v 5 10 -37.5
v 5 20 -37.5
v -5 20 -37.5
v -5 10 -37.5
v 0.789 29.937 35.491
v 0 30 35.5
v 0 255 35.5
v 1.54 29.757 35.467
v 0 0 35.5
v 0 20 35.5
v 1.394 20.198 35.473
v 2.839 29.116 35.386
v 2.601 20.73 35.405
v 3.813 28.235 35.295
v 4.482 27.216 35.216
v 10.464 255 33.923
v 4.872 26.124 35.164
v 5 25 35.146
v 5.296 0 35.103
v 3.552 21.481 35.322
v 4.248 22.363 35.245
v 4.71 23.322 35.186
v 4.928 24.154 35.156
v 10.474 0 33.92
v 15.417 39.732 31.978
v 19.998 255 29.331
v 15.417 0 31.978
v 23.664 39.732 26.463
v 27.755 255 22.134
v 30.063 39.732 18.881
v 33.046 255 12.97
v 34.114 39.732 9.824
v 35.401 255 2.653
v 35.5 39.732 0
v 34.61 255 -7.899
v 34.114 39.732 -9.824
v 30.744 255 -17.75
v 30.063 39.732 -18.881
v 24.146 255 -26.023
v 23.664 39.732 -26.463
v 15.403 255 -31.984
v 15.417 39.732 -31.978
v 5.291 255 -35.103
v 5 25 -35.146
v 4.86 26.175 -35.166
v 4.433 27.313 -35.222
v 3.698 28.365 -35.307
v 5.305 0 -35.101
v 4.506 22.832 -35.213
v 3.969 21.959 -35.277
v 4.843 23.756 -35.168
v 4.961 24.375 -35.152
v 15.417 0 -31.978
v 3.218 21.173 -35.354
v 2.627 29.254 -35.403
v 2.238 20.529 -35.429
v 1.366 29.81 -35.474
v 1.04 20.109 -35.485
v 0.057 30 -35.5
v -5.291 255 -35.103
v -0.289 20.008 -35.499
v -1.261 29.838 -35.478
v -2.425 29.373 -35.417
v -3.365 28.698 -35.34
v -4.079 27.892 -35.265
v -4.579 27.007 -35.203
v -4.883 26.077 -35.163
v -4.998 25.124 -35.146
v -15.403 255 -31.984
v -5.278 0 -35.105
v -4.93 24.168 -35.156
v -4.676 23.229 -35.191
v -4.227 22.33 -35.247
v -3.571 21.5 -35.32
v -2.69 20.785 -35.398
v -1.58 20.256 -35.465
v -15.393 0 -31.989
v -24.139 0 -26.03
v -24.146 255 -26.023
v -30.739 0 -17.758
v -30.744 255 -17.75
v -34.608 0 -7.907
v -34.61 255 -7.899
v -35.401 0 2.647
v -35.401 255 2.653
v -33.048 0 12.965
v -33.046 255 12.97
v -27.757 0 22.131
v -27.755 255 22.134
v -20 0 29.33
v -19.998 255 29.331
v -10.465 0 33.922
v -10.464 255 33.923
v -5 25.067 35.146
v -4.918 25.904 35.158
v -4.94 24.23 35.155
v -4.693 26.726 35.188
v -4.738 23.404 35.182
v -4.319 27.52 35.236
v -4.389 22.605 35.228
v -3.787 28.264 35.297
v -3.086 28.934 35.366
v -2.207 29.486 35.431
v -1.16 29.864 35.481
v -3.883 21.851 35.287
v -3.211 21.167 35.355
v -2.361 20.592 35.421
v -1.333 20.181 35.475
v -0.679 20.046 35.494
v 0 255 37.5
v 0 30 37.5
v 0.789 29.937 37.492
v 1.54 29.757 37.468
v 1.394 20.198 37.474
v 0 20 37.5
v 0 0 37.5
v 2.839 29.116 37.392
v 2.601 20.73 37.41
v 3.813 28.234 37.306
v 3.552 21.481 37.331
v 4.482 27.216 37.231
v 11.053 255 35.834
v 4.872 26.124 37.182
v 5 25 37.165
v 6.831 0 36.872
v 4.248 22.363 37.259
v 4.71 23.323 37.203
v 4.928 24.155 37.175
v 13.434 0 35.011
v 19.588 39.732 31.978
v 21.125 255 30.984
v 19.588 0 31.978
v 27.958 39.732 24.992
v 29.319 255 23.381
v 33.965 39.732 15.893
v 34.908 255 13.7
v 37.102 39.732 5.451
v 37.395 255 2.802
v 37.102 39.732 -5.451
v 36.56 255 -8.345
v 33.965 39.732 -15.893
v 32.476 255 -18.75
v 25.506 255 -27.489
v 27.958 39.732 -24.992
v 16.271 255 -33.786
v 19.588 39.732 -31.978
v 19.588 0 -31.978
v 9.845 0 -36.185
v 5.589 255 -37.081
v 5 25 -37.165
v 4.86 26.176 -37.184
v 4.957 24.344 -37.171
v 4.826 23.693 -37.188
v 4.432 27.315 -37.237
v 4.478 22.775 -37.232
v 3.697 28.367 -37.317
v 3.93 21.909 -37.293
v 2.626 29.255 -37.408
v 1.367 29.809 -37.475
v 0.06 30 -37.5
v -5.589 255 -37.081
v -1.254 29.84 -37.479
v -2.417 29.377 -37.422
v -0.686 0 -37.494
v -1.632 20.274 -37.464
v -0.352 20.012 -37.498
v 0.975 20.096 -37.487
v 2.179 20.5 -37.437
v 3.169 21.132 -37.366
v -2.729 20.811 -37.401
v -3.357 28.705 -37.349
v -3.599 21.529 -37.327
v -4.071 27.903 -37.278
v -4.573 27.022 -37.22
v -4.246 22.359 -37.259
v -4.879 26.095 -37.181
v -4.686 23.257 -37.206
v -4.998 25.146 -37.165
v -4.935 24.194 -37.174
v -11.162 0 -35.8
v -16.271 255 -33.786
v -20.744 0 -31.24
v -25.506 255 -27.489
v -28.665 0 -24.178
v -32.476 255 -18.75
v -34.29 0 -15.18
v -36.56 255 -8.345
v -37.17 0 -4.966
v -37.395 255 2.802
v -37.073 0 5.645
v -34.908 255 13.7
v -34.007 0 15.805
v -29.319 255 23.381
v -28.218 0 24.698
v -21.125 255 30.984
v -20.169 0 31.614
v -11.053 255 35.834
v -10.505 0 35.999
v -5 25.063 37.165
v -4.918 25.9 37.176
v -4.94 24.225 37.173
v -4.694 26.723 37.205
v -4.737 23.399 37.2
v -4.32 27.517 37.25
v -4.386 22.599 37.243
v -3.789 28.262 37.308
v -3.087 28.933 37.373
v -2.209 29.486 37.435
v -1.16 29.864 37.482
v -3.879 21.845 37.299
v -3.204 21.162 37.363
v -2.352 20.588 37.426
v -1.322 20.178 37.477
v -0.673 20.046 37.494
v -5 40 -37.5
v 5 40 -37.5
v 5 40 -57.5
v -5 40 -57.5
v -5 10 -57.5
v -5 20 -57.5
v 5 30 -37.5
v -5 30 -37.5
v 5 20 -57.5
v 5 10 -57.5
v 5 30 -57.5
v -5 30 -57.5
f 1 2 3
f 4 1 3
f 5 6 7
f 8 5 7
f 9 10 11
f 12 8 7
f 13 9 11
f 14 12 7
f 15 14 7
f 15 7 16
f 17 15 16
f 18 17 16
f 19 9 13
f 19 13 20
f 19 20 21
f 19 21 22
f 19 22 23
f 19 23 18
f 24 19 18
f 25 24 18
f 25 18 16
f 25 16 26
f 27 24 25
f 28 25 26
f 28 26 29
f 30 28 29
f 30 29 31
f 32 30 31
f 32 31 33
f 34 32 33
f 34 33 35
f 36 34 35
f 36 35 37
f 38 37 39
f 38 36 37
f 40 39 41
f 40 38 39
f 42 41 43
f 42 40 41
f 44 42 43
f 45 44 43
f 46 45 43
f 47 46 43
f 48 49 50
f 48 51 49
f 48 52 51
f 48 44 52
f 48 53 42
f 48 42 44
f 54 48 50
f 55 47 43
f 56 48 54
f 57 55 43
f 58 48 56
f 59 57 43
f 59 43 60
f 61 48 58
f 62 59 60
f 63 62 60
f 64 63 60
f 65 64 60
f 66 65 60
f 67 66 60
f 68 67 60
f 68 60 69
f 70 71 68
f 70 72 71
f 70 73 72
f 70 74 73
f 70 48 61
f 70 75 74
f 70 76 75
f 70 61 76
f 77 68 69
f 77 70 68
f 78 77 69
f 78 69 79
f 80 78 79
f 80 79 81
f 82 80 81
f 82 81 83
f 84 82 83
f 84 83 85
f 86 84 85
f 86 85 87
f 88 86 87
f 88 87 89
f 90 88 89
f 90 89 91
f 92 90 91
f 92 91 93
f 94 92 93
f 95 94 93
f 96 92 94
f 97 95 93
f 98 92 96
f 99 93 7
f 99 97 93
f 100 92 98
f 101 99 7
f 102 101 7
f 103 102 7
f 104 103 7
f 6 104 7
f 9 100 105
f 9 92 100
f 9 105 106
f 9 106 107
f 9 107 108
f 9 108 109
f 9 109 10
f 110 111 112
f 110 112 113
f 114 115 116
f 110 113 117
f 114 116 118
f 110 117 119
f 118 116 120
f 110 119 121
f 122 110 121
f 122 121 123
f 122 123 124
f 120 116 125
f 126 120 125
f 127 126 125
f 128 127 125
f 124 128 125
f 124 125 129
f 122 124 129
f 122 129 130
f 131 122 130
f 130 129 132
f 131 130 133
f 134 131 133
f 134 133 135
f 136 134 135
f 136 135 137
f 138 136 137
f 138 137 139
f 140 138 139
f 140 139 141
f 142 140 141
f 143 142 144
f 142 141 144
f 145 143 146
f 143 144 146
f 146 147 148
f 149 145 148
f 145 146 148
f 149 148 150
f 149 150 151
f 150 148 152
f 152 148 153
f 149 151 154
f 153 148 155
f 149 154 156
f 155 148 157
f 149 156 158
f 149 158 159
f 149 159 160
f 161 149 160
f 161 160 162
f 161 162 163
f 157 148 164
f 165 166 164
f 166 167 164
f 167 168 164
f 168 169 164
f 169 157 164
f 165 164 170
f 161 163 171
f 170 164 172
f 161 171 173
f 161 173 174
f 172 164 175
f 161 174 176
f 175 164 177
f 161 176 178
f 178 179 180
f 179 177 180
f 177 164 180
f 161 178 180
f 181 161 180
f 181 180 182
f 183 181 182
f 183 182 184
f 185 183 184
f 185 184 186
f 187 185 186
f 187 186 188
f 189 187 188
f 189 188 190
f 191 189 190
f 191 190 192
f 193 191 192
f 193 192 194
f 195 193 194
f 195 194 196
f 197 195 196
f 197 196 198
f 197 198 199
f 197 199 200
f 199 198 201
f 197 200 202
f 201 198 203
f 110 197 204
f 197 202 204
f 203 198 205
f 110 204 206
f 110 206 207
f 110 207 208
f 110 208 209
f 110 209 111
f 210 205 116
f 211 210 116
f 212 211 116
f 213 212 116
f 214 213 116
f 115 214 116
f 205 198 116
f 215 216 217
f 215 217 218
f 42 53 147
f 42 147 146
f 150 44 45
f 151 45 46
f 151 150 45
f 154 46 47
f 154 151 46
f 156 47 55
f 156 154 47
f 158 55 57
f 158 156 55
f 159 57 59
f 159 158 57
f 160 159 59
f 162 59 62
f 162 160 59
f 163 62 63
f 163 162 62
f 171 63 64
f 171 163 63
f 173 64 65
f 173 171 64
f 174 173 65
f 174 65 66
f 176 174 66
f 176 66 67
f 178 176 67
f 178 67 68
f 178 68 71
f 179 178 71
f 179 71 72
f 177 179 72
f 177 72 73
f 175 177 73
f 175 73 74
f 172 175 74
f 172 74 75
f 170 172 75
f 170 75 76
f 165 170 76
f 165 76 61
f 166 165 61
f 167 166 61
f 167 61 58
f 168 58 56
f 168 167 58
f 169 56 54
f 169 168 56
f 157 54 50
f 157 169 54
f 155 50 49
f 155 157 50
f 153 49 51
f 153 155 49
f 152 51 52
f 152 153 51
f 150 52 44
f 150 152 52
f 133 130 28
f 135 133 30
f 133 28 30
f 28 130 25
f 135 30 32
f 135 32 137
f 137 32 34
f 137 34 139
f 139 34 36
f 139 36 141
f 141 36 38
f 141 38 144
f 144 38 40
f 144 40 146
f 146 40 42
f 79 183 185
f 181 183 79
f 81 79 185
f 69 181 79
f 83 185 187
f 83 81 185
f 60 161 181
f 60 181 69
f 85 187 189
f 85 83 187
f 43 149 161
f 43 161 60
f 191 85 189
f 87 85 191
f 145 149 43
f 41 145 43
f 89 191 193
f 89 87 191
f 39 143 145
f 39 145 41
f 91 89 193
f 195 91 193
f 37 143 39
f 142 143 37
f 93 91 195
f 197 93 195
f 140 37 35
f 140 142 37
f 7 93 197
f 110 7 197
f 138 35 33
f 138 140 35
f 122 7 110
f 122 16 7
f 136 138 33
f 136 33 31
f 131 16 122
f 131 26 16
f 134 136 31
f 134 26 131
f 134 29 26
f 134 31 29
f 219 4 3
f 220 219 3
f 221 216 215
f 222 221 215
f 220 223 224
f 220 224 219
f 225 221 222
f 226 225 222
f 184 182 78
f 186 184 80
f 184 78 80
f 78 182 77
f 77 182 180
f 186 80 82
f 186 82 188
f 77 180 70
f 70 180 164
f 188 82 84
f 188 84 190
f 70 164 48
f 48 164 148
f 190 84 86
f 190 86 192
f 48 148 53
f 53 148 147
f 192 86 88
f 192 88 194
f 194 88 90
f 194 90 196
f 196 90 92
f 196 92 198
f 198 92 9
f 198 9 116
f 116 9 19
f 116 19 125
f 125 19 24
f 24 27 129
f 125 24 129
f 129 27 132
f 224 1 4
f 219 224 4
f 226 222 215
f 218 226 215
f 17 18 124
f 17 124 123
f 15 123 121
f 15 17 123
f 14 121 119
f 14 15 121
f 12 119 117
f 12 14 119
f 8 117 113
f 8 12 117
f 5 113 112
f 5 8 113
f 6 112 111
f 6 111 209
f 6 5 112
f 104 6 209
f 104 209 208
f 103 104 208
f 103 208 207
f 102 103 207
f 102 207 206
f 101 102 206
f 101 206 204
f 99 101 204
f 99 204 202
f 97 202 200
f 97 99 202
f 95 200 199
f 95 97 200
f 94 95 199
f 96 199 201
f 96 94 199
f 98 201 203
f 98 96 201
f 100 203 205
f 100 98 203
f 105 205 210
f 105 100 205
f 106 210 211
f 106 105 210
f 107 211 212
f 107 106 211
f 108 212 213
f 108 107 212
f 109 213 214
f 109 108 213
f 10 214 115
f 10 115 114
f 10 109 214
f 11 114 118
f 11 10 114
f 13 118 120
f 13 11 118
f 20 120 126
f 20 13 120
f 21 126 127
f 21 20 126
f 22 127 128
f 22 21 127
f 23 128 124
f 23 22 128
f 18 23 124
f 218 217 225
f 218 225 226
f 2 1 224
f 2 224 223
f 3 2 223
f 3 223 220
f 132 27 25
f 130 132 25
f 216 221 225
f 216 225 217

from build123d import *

# Parameters (mm, degrees)
SKETCH1_R               = 37.5
SKETCH1_R_2             = 35.5
BOSS_EXTRUDE1_DEPTH     = 255
CUT_EXTRUDE1_DEPTH      = 261.456330313
CUT_EXTRUDE1_DEPTH_BACK = 261.456330313
SKETCH2_R               = 5
SKETCH3_W               = 10
SKETCH3_H               = 10
BOSS_EXTRUDE2_DEPTH     = 20
BOSS_EXTRUDE2_2_DEPTH   = 20
SKETCH4_W               = 63.955545956
SKETCH4_H               = 79.134684629
CUT_EXTRUDE2_DEPTH      = 265.078586899


with BuildPart() as part:
    # Sketch1 → Boss-Extrude1 (new body)
    with BuildSketch(Plane(origin=(0, 0, 0), x_dir=(1, 0, 0), z_dir=(0, 1, 0))):
        with Locations(Location((0, 0, 0), (0, 0, 270))):
            Circle(SKETCH1_R)
        with Locations(Location((0, 0, 0), (0, 0, 270))):
            Circle(SKETCH1_R_2, mode=Mode.SUBTRACT)
    extrude(amount=BOSS_EXTRUDE1_DEPTH)

    # Sketch2 → Cut-Extrude1 (cut, two sides: drawn at the far end of the back side and taken through both)
    with BuildSketch(Plane.XY.offset(-CUT_EXTRUDE1_DEPTH_BACK)):
        with Locations((0, 25)):
            Circle(SKETCH2_R)
    extrude(amount=CUT_EXTRUDE1_DEPTH + CUT_EXTRUDE1_DEPTH_BACK, mode=Mode.SUBTRACT)

    # Sketch4 → Cut-Extrude2 (cut, through all)
    with BuildSketch(Plane(origin=(0, 0, 0), x_dir=(0, 0, -1), z_dir=(1, 0, 0))):
        with Locations((0, 0.164686538)):
            Rectangle(SKETCH4_W, SKETCH4_H)
    extrude(amount=CUT_EXTRUDE2_DEPTH, mode=Mode.SUBTRACT)


with BuildPart() as body_2:
    # Sketch3 → Boss-Extrude2 (new body)
    with BuildSketch(Plane(origin=(0, 0, -37.5), x_dir=(-1, 0, 0), z_dir=(0, 0, -1))):
        with Locations((0, 35)):
            Rectangle(SKETCH3_W, SKETCH3_H)
    extrude(amount=BOSS_EXTRUDE2_DEPTH)


with BuildPart() as body_3:
    # Sketch3 → Boss-Extrude2 2 (new body)
    with BuildSketch(Plane(origin=(0, 0, -37.5), x_dir=(-1, 0, 0), z_dir=(0, 0, -1))):
        with Locations((0, 15)):
            Rectangle(SKETCH3_W, SKETCH3_H)
    extrude(amount=BOSS_EXTRUDE2_2_DEPTH)


solid = Compound([part.part, body_2.part, body_3.part])
